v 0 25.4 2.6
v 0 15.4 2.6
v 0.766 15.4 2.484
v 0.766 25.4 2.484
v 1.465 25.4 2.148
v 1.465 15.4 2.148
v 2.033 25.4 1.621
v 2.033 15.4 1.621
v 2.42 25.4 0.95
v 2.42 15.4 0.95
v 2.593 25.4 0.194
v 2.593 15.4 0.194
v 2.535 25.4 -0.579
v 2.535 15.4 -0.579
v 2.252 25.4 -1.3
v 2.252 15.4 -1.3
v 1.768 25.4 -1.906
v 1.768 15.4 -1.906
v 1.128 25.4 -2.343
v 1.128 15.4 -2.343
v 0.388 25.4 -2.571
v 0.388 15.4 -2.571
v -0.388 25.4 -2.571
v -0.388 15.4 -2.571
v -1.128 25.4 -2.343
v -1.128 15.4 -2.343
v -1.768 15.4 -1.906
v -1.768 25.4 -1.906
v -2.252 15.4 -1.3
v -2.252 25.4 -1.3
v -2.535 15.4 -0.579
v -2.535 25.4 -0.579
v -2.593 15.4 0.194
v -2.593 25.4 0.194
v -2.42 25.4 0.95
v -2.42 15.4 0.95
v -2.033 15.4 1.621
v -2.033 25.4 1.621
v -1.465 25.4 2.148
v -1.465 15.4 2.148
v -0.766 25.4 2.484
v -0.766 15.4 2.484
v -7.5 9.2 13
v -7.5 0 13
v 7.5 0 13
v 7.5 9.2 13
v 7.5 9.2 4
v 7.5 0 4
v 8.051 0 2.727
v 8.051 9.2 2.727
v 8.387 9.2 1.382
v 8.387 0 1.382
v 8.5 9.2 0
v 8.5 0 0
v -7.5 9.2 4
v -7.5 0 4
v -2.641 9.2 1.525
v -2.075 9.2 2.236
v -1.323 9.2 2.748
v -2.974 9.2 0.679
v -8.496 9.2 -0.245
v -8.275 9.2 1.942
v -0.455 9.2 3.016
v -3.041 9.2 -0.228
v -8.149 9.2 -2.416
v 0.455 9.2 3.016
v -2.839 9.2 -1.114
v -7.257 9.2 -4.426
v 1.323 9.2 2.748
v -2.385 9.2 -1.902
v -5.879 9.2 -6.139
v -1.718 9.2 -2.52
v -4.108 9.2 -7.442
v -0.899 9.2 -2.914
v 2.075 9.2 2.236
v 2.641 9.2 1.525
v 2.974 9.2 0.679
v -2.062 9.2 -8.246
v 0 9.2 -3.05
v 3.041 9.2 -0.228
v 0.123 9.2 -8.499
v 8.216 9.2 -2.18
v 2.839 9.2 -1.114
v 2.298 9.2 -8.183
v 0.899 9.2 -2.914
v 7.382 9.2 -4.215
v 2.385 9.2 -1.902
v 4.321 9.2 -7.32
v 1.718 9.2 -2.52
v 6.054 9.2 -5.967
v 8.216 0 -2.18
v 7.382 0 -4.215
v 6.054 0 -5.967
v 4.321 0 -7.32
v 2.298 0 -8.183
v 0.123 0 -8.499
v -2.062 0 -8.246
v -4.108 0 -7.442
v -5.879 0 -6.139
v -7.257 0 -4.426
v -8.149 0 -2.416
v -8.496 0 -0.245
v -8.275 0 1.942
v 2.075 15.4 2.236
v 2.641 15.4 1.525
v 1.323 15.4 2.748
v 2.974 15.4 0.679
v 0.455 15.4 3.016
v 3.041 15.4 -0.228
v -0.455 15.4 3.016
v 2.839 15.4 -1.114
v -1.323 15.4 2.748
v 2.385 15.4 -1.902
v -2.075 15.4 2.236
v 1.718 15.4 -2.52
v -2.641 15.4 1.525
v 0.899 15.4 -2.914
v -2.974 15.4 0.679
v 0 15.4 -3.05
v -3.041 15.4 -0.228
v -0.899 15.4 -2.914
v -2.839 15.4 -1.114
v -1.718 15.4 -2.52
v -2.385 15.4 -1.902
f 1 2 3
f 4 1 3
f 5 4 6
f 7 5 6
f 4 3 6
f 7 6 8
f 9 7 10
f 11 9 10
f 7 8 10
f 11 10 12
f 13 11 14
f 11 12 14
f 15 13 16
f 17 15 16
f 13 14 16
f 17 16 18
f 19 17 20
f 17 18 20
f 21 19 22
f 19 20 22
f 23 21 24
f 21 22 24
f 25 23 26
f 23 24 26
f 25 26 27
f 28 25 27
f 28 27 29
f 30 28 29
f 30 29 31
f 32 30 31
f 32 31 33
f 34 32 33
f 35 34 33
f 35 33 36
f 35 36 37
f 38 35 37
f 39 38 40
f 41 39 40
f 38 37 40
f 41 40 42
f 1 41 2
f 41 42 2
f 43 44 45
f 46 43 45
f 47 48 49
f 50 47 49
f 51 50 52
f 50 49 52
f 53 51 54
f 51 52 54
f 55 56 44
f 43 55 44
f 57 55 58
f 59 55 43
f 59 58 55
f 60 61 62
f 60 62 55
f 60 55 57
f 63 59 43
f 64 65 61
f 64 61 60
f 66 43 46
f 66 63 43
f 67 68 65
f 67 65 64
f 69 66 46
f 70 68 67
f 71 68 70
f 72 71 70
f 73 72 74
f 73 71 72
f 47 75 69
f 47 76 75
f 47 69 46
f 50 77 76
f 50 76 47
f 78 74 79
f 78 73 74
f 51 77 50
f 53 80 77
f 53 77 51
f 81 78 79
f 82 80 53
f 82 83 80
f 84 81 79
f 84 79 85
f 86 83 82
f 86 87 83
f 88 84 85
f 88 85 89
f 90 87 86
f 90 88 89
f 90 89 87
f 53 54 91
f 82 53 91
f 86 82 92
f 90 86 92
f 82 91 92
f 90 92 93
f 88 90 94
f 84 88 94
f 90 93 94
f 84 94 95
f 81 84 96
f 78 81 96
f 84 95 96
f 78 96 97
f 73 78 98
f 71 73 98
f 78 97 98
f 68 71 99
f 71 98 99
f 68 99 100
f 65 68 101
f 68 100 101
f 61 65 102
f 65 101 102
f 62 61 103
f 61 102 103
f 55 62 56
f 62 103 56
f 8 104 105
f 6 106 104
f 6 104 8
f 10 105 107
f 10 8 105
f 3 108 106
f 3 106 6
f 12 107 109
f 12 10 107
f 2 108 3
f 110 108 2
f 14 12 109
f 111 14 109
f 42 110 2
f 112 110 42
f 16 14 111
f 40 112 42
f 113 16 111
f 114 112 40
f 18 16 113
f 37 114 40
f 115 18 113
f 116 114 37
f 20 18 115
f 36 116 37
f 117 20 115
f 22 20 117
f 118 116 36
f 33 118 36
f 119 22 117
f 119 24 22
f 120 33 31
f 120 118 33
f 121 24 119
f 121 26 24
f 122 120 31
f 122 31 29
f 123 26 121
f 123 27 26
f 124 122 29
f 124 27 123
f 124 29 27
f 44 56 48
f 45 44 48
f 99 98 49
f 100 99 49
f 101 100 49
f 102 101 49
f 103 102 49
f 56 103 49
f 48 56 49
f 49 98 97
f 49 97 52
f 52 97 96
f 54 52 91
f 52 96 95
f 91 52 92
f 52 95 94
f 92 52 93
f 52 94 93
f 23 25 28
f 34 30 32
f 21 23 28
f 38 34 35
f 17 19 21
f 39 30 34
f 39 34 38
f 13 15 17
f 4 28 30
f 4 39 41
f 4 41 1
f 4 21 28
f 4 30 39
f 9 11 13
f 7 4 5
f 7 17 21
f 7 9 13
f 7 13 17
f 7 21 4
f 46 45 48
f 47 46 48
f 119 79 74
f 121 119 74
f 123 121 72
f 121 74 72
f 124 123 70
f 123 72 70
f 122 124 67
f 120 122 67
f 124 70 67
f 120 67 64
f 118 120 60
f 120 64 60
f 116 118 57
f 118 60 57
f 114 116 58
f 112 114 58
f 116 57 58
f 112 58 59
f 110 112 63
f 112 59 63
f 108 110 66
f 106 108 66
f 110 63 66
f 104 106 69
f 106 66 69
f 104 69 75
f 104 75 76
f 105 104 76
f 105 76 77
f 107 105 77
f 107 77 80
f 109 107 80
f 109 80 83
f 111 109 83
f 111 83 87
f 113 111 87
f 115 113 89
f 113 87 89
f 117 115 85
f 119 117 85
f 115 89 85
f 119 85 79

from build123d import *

# Parameters (mm, degrees)
BOSS_EXTRUDE1_DEPTH = 9.2
SKETCH2_R           = 3.05
BOSS_EXTRUDE2_DEPTH = 6.2
SKETCH3_R           = 2.6
BOSS_EXTRUDE3_DEPTH = 10


with BuildPart() as part:
    # Sketch1 → Boss-Extrude1 (new body)
    with BuildSketch(Plane(origin=(0, 0, 0), x_dir=(1, 0, 0), z_dir=(0, 1, 0))):
        with BuildLine():
            ThreePointArc((8.5, 0), (-2.061552813, 8.246211251), (-7.5, -4))
            Line((-7.5, -4), (7.5, -4))
            ThreePointArc((7.5, -4), (8.246211251, -2.061552813), (8.5, 0))
        make_face()
        with BuildLine():
            Line((7.5, -4), (-7.5, -4))
            ThreePointArc((-7.5, -4), (0, -8.5), (7.5, -4))
        make_face()
        with BuildLine():
            ThreePointArc((7.5, -4), (0, -8.5), (-7.5, -4))
            Line((-7.5, -4), (-7.5, -13))
            Line((-7.5, -13), (7.5, -13))
            Line((7.5, -13), (7.5, -4))
        make_face()
    extrude(amount=BOSS_EXTRUDE1_DEPTH)

    # Sketch2 → Boss-Extrude2 (add)
    with BuildSketch(Plane(origin=(0, 9.2, 0), x_dir=(1, 0, 0), z_dir=(0, 1, 0))):
        with Locations(Location((0, 0, 0), (0, 0, 90))):
            Circle(SKETCH2_R)
    extrude(amount=BOSS_EXTRUDE2_DEPTH)

    # Sketch3 → Boss-Extrude3 (add)
    with BuildSketch(Plane(origin=(0, 15.4, 0), x_dir=(1, 0, 0), z_dir=(0, 1, 0))):
        with Locations(Location((0, 0, 0), (0, 0, 270))):
            Circle(SKETCH3_R)
    extrude(amount=BOSS_EXTRUDE3_DEPTH)


solid = part.part
